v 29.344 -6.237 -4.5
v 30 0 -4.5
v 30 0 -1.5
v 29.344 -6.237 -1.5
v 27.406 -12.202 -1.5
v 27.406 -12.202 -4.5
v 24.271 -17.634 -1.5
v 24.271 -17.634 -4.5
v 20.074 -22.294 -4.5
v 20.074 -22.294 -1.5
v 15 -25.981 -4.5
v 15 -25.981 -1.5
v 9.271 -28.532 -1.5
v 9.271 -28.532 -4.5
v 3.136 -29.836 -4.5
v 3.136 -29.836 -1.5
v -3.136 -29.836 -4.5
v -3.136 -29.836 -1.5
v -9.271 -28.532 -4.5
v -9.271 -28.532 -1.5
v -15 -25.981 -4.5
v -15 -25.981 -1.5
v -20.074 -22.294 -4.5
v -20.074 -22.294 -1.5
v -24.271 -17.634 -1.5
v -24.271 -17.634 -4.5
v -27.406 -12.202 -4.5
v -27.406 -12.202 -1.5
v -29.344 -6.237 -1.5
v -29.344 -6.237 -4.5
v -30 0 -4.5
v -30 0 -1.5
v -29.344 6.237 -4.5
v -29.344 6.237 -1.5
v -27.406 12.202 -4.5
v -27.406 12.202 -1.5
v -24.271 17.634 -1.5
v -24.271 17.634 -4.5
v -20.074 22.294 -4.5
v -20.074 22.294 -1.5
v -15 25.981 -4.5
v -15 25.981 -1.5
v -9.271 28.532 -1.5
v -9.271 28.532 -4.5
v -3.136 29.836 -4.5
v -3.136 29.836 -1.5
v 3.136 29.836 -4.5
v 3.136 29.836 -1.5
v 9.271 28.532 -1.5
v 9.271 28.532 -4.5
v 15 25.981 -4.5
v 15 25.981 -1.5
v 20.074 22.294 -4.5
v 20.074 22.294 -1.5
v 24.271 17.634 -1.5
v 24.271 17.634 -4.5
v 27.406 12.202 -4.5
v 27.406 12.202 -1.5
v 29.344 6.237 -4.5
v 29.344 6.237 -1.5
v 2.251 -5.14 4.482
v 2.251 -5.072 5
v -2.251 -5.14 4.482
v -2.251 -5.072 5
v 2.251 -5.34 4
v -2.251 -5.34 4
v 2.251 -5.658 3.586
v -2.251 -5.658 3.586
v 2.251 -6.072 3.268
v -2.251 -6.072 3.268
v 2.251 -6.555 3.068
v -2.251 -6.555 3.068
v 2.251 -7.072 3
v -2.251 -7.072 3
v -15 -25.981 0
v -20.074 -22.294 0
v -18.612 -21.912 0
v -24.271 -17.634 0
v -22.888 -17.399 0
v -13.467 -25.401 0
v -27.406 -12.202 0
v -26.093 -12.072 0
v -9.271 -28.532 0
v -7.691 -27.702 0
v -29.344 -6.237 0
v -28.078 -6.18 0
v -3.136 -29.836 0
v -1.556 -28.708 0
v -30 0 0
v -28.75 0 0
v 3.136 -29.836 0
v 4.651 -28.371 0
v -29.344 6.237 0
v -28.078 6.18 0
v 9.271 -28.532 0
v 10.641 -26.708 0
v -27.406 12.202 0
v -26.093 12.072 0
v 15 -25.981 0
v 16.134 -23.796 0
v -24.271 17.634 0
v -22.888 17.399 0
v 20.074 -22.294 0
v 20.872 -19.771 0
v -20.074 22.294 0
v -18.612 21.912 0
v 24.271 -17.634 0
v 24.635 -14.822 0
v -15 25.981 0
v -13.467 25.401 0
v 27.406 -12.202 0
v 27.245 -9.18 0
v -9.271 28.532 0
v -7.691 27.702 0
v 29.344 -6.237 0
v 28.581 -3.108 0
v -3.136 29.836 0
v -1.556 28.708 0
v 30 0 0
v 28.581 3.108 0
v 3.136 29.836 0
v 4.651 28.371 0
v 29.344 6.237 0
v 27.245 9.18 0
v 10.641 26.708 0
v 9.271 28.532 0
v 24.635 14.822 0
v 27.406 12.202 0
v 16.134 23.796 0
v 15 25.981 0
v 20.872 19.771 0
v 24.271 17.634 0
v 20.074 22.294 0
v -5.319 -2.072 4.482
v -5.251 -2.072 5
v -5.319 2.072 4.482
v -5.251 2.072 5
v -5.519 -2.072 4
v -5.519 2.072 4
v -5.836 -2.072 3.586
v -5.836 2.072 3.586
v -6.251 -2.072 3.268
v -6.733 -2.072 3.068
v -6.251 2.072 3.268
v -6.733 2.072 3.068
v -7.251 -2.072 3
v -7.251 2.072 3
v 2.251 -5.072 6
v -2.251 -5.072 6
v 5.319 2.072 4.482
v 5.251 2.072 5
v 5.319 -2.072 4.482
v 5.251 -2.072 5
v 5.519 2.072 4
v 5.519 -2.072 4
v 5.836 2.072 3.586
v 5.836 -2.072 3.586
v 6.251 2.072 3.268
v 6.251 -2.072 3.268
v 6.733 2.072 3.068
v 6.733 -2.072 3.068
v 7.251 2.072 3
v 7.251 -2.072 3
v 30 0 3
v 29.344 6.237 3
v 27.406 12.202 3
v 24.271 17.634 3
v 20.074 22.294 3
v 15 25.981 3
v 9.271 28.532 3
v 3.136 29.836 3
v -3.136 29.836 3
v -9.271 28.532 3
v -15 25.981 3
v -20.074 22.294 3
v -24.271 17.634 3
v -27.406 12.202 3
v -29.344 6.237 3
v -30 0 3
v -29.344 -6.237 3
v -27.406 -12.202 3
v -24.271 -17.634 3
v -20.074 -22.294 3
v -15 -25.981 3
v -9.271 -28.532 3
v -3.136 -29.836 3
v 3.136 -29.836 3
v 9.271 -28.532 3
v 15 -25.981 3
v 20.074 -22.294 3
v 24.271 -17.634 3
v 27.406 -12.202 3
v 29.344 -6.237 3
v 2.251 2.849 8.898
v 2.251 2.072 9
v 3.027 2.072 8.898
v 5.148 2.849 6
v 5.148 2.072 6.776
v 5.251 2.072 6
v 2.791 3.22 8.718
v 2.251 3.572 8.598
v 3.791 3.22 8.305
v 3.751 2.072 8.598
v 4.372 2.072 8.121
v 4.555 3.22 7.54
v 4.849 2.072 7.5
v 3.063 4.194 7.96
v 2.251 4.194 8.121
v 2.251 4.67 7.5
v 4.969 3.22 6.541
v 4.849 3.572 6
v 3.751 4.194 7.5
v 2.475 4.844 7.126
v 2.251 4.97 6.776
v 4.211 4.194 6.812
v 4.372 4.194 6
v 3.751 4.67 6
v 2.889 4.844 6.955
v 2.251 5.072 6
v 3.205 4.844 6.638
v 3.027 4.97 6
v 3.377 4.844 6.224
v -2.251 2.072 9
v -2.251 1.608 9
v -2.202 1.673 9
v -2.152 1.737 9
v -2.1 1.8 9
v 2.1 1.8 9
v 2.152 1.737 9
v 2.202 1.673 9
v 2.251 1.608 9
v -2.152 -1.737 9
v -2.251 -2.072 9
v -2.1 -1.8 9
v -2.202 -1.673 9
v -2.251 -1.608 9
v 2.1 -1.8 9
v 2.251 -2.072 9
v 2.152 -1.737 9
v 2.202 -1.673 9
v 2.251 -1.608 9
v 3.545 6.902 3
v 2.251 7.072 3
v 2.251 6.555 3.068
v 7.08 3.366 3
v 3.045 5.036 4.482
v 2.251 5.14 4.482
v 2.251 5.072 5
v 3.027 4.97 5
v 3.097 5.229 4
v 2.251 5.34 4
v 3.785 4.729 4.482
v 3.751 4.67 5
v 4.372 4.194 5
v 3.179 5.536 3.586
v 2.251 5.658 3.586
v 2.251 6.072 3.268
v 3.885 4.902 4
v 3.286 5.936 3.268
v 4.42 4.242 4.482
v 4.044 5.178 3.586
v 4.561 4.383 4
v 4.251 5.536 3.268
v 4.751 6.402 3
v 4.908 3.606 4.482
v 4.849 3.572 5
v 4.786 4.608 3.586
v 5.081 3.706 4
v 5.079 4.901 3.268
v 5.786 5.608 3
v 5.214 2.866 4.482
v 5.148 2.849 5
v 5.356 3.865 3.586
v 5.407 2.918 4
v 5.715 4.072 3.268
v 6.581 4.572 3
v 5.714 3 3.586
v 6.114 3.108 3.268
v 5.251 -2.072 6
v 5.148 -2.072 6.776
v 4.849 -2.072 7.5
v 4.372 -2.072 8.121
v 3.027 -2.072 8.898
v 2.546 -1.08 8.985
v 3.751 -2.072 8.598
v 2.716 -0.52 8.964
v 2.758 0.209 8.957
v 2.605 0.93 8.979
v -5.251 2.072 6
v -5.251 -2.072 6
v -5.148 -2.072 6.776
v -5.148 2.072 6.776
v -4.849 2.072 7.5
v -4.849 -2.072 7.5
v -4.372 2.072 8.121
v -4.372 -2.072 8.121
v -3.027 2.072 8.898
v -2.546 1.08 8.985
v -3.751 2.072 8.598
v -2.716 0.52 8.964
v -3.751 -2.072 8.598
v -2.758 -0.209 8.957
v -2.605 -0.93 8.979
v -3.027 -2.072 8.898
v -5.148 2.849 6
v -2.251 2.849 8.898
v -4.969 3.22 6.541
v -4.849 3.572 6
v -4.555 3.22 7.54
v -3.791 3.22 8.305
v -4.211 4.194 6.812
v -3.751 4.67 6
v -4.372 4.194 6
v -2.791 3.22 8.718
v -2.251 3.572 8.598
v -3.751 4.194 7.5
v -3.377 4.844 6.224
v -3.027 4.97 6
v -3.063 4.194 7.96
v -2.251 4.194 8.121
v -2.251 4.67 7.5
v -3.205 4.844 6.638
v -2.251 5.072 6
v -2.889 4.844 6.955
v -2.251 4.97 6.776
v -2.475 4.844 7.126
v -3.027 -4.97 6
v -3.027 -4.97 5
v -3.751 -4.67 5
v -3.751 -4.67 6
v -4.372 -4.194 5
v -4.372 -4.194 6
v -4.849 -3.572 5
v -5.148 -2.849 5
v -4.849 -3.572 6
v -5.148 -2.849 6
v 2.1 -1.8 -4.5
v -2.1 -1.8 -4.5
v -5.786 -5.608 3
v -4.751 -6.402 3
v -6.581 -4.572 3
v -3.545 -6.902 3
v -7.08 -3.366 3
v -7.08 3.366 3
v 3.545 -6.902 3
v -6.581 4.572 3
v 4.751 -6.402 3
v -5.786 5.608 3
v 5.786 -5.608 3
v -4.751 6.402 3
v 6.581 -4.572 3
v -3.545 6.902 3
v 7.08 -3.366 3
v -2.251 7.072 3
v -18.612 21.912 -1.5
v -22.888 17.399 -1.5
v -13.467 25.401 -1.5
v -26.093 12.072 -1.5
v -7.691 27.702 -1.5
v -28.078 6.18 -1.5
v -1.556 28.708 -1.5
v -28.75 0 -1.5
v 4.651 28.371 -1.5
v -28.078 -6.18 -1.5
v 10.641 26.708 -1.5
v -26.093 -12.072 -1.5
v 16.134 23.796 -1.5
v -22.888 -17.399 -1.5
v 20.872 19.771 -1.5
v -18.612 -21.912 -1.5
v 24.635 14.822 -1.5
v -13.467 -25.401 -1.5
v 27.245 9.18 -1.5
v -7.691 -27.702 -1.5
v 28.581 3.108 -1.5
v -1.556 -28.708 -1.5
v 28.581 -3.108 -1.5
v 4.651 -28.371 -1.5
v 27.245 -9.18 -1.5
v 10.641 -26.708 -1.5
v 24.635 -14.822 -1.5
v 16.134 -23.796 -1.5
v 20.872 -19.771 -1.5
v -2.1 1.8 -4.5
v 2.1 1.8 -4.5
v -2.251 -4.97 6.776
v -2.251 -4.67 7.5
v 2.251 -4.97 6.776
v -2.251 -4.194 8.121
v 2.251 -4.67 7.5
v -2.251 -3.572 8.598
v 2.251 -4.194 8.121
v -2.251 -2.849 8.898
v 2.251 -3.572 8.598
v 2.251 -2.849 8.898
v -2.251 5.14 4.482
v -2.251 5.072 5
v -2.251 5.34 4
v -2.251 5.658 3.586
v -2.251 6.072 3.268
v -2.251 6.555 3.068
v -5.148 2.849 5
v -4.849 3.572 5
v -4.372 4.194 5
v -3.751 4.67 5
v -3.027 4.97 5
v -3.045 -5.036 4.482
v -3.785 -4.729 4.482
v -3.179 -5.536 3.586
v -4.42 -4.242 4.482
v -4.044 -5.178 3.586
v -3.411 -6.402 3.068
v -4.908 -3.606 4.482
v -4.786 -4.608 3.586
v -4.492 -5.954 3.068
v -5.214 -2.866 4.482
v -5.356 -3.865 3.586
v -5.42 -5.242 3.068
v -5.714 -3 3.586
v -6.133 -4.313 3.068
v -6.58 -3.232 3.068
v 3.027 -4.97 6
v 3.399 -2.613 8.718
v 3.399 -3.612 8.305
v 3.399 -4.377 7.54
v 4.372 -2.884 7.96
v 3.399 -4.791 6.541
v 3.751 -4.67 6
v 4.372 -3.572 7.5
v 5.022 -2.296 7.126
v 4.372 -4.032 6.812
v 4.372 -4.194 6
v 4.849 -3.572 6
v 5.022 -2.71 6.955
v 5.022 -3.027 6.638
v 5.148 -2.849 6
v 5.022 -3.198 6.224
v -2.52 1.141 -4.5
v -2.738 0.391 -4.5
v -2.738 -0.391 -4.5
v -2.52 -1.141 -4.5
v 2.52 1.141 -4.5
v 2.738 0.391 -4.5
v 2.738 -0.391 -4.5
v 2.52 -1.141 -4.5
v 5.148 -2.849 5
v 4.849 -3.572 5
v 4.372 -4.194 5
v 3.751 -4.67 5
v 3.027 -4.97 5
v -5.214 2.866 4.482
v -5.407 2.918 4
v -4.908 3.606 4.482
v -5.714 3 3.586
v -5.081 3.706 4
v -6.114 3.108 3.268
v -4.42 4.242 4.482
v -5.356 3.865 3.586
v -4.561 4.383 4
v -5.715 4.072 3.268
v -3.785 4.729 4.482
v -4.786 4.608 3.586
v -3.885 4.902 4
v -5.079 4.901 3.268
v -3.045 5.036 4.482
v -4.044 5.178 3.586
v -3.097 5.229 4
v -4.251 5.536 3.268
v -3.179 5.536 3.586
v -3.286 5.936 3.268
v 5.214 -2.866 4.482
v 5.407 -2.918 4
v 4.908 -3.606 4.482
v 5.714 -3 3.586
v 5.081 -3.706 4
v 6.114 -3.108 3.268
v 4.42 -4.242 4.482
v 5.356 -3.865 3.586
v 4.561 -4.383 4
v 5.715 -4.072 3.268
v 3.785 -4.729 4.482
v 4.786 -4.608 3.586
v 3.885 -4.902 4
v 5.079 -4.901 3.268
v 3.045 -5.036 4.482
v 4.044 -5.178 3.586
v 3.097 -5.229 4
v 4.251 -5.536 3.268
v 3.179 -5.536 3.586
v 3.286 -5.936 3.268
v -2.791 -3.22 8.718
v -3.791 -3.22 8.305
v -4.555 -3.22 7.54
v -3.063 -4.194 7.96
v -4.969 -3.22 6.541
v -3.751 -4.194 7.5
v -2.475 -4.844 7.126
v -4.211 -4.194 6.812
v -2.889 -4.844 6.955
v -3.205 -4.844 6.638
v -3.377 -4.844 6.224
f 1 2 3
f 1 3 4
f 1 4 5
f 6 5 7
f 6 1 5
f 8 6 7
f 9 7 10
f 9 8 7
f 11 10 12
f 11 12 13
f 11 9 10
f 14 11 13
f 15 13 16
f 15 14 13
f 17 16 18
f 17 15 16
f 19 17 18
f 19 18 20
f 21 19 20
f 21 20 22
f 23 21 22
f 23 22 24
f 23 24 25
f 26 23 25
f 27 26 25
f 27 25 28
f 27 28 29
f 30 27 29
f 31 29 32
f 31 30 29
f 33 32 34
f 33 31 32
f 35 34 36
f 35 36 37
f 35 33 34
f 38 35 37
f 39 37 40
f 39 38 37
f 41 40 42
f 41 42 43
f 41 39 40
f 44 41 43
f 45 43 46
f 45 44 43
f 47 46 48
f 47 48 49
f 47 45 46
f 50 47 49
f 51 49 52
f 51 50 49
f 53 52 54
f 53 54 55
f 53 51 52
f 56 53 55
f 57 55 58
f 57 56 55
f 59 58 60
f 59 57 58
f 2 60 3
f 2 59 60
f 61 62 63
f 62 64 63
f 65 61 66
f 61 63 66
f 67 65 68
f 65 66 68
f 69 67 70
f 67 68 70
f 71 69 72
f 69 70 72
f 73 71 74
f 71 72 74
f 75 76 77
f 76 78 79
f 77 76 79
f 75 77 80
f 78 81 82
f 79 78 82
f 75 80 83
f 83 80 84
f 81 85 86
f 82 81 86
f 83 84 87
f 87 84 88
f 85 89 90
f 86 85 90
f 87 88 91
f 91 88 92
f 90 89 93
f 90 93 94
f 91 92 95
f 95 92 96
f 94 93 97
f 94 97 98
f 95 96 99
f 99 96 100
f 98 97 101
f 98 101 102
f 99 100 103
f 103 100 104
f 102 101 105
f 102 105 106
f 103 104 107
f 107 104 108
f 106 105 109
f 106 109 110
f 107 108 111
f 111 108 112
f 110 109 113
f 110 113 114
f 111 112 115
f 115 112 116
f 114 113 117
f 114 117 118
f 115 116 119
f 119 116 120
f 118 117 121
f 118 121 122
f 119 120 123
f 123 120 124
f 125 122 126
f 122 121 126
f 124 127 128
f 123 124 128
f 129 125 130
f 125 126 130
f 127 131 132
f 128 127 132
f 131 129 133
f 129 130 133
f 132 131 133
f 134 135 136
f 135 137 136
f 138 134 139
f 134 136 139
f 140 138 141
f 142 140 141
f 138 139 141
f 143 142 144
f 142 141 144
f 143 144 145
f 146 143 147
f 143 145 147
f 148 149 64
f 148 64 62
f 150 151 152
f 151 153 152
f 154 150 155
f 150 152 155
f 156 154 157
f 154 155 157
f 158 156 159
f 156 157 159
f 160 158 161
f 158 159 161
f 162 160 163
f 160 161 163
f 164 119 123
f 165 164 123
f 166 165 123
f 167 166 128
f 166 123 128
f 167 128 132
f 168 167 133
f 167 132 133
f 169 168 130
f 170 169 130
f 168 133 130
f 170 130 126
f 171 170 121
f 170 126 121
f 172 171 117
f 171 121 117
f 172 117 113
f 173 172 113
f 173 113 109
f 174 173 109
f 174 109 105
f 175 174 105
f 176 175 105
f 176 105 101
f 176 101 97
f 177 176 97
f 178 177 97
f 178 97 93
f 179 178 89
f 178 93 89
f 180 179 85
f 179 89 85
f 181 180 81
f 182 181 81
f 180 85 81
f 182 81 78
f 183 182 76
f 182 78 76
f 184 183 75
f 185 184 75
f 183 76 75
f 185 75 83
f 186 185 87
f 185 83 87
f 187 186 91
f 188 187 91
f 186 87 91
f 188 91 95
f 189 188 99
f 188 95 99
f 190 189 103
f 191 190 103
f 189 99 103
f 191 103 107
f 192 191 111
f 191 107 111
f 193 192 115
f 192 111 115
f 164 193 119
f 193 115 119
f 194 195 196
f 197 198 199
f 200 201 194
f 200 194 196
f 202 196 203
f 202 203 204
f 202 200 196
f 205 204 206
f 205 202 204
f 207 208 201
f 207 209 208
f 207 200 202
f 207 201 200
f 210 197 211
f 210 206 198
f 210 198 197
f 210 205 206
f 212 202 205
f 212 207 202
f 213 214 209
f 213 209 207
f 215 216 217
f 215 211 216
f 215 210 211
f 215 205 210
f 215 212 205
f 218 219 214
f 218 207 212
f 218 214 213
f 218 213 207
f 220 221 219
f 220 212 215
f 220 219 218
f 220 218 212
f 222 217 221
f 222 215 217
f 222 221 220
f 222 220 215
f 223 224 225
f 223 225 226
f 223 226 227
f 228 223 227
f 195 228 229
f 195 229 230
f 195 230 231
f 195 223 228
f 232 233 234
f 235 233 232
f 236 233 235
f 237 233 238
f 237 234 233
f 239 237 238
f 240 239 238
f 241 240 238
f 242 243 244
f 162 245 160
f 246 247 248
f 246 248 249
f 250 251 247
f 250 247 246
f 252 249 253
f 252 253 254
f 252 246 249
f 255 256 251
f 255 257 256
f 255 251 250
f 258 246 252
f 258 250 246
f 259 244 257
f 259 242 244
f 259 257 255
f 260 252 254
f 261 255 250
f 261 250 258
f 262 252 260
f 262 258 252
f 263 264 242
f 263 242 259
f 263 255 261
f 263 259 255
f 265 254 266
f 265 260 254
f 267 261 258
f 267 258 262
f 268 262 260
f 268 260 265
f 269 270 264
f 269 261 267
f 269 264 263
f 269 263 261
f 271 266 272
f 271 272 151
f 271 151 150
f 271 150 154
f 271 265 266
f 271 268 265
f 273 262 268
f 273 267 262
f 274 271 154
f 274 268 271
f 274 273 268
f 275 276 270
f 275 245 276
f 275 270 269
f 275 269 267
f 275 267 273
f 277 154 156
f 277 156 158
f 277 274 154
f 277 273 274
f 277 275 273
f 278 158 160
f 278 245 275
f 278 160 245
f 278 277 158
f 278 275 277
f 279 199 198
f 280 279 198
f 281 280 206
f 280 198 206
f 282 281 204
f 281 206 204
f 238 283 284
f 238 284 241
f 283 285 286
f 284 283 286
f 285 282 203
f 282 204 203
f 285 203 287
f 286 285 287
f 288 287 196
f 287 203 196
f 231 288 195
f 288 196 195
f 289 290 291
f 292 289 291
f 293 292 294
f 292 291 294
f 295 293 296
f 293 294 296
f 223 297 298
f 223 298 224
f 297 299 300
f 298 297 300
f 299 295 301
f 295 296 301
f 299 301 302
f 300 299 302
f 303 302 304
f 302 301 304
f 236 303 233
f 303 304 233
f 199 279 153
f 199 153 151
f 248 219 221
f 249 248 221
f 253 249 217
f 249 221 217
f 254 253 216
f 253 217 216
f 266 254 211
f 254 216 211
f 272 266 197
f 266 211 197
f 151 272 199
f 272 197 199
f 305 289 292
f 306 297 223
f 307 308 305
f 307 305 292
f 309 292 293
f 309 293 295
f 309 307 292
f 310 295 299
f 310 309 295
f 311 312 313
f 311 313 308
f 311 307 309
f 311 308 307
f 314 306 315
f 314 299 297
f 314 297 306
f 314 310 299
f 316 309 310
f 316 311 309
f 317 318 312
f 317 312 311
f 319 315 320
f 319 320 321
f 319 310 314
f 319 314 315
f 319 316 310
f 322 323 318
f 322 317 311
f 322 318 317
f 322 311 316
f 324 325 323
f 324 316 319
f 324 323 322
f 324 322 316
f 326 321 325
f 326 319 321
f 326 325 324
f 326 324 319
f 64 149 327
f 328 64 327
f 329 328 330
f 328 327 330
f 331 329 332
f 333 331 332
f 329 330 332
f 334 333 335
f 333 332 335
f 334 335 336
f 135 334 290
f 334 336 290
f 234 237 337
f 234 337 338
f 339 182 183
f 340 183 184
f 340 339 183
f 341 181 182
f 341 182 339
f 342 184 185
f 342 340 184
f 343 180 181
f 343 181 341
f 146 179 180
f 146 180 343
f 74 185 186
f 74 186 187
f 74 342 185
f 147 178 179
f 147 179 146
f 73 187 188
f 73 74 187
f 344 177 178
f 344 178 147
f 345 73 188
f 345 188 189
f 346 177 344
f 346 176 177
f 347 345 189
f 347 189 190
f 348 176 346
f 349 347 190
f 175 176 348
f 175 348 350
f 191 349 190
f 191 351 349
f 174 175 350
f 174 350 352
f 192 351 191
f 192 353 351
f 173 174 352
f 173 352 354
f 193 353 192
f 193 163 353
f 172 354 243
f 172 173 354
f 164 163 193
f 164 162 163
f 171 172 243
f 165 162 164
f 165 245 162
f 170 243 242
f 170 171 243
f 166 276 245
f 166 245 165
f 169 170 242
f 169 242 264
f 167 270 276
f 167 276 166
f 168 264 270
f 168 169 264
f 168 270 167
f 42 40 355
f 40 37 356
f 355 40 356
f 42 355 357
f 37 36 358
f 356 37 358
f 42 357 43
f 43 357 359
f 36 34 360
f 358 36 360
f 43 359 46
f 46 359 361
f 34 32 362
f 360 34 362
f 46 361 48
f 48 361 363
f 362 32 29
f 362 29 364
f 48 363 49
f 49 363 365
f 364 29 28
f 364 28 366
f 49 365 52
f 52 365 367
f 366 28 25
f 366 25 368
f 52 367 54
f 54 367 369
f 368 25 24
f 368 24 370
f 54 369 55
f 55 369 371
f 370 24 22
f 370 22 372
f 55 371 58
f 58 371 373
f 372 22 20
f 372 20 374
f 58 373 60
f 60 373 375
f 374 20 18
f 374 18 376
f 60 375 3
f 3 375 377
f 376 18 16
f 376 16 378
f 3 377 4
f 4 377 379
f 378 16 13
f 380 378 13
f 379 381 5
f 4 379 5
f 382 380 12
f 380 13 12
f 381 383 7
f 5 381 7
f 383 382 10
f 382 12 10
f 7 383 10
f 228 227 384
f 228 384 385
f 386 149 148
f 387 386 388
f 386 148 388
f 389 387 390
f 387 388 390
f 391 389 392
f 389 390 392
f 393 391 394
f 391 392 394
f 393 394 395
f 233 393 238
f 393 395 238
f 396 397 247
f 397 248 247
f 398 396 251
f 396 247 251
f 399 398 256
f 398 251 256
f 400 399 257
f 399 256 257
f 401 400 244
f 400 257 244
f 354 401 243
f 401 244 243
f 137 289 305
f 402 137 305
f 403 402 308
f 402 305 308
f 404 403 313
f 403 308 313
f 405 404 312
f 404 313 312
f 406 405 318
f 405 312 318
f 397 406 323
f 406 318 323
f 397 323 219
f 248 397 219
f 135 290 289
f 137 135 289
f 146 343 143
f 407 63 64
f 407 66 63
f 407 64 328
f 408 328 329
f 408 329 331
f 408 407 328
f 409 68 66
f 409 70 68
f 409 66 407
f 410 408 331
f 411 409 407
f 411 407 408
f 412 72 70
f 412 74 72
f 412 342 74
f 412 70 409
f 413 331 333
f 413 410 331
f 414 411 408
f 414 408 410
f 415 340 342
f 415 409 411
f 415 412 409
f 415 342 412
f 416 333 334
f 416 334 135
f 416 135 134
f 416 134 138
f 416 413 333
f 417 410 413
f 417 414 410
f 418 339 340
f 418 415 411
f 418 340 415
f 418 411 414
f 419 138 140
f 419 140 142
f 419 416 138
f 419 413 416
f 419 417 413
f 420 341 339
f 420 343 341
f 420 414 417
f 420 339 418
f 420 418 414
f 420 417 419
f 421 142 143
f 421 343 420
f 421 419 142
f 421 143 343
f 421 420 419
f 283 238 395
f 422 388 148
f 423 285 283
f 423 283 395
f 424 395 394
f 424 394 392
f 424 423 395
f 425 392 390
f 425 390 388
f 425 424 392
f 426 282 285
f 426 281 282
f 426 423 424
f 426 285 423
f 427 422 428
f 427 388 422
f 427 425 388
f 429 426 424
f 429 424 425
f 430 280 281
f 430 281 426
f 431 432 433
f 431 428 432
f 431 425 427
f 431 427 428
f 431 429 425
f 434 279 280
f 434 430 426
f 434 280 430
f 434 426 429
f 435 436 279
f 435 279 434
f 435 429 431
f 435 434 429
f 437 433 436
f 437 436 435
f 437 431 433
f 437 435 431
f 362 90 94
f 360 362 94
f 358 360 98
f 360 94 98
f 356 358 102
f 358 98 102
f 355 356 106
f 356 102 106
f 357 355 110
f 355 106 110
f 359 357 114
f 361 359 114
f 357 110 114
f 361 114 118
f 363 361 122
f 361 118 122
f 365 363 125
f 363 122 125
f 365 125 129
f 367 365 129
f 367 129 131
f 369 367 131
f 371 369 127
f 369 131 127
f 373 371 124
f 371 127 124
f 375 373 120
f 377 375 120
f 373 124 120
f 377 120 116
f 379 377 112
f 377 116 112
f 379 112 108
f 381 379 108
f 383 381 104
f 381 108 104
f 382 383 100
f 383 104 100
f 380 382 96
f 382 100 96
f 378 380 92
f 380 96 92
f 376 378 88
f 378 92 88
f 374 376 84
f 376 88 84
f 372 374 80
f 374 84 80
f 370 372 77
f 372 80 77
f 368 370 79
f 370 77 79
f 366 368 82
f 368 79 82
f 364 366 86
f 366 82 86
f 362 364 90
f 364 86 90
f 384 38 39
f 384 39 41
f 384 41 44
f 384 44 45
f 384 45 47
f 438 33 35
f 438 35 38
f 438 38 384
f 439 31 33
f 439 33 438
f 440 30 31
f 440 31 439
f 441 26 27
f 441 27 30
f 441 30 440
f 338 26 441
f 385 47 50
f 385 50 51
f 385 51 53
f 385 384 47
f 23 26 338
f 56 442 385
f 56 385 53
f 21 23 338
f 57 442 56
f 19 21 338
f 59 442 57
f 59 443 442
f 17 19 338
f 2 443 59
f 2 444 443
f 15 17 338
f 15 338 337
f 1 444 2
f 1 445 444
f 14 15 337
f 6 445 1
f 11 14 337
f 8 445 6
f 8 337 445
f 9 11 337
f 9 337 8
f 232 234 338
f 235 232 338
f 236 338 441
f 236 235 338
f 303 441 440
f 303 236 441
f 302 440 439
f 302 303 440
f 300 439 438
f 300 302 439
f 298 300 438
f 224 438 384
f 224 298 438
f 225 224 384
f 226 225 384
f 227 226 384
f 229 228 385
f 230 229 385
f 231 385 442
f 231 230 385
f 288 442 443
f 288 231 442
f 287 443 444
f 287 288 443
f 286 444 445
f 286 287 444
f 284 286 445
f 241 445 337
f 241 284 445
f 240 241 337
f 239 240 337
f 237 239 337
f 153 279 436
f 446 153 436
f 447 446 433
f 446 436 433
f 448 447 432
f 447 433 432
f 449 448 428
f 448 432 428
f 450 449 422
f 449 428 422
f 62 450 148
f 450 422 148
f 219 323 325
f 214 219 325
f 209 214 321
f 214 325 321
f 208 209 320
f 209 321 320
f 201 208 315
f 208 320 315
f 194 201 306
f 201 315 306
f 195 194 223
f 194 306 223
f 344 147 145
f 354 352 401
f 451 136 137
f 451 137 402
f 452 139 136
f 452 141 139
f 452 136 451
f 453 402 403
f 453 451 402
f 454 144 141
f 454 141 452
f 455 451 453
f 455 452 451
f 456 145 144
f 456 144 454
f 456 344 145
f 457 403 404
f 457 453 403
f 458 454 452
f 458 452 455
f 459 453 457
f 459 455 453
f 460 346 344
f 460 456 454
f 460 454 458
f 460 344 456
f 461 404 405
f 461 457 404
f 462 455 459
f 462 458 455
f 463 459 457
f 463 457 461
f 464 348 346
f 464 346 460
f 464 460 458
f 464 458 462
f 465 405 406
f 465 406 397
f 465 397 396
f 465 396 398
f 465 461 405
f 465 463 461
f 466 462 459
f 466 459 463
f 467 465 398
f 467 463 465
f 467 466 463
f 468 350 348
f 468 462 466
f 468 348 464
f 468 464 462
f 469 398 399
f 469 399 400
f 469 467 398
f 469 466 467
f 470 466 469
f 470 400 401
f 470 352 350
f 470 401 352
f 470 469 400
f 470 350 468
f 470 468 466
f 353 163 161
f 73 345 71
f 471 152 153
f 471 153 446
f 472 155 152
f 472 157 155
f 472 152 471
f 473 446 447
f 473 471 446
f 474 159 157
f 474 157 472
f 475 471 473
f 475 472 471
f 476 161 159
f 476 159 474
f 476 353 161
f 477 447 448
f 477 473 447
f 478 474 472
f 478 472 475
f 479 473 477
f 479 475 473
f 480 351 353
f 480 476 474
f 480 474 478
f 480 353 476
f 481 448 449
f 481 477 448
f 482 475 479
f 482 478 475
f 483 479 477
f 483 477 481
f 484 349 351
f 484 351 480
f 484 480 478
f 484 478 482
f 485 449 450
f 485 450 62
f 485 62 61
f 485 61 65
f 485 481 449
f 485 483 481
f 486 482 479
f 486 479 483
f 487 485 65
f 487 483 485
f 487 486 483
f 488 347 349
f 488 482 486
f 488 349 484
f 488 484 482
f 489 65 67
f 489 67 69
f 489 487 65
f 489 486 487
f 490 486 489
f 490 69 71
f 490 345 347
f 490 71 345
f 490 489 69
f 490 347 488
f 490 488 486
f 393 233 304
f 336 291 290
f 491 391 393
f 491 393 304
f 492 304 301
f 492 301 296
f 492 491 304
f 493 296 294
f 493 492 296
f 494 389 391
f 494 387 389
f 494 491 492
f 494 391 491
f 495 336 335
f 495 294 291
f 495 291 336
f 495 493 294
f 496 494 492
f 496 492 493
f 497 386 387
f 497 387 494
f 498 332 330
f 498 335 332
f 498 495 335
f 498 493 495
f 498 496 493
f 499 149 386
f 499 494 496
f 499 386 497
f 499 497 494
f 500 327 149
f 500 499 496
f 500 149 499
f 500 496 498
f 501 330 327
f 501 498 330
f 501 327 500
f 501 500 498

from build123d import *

# Parameters (mm, degrees)
ESQUISSE2_R             = 30
BOSS_EXTRU_1_DEPTH      = 3
ENL_V_MAT_EXTRU_1_DEPTH = 43.532340636
BOSS_EXTRU_3_START      = 6
ESQUISSE5_W             = 10.501413836
ESQUISSE5_H             = 10.144569676
BOSS_EXTRU_3_DEPTH      = 6
ESQUISSE8_R             = 28.75
BOSS_EXTRU_4_DEPTH      = 1.5
BOSS_EXTRU_5_START      = 3
ESQUISSE9_R             = 30
BOSS_EXTRU_5_DEPTH      = 3
ENL_V_MAT_EXTRU_4_DEPTH = 44.370496884
CONG_1_R                = 3
CONG_2_R                = 2


with BuildPart() as part:
    # Esquisse2 → Boss.-Extru.1 (new body)
    with BuildSketch(Plane.XY):
        Circle(ESQUISSE2_R)
    extrude(amount=BOSS_EXTRU_1_DEPTH)

    # Esquisse4 → Enlèv. mat.-Extru.1 (cut, through all)
    with BuildSketch(Plane.XY.offset(3)):
        with BuildLine():
            Line((-2.1, -1.8), (2.1, -1.8))
            ThreePointArc((2.1, -1.8), (2.765863337, 0), (2.1, 1.8))
            Line((2.1, 1.8), (-2.1, 1.8))
            ThreePointArc((-2.1, 1.8), (-2.765863337, 0), (-2.1, -1.8))
        make_face()
    extrude(amount=-ENL_V_MAT_EXTRU_1_DEPTH, mode=Mode.SUBTRACT)

    # Esquisse5 → Boss.-Extru.3 (add)
    with BuildSketch(Plane.XY.offset(3).offset(BOSS_EXTRU_3_START)):
        Rectangle(ESQUISSE5_W, ESQUISSE5_H)
        with BuildLine():
            Line((-2.1, 1.8), (2.1, 1.8))
            ThreePointArc((2.1, 1.8), (2.765863337, 0), (2.1, -1.8))
            Line((2.1, -1.8), (-2.1, -1.8))
            ThreePointArc((-2.1, -1.8), (-2.765863337, 0), (-2.1, 1.8))
        make_face(mode=Mode.SUBTRACT)
    extrude(amount=-BOSS_EXTRU_3_DEPTH)

    # Esquisse8 → Boss.-Extru.4 (add)
    with BuildSketch(Plane(origin=(0, 0, 0), x_dir=(-1, 0, 0), z_dir=(0, 0, -1))):
        Circle(ESQUISSE8_R)
    extrude(amount=BOSS_EXTRU_4_DEPTH)

    # Esquisse9 → Boss.-Extru.5 (add)
    with BuildSketch(Plane(origin=(0, 0, -1.5), x_dir=(-1, 0, 0), z_dir=(0, 0, -1)).offset(BOSS_EXTRU_5_START)):
        with Locations(Location((0, 0, 0), (0, 0, 180))):
            Circle(ESQUISSE9_R)
    extrude(amount=-BOSS_EXTRU_5_DEPTH)

    # Esquisse10 → Enlèv. mat.-Extru.4 (cut, through all)
    with BuildSketch(Plane.XY):
        with BuildLine():
            Line((-2.1, 1.8), (2.1, 1.8))
            ThreePointArc((2.1, 1.8), (2.765863337, 0), (2.1, -1.8))
            Line((2.1, -1.8), (-2.1, -1.8))
            ThreePointArc((-2.1, -1.8), (-2.765863337, 0), (-2.1, 1.8))
        make_face()
    extrude(amount=-ENL_V_MAT_EXTRU_4_DEPTH, mode=Mode.SUBTRACT)

    # Congé1
    # the kernel refuses this fillet: 3 mm, written as the material it takes off along each edge
    with BuildSketch(Plane(origin=(-2.250706918, -2.072284838, 6), x_dir=(-1, 0, 0), z_dir=(0, -1, 0))) as cong_1_piece_1_section:
        Polygon((0, 0), (CONG_1_R, 0), (CONG_1_R, -CONG_1_R), (0, -CONG_1_R), align=None)
    cong_1_piece_1 = extrude(amount=CONG_1_R, mode=Mode.PRIVATE)
    cong_1_piece_1 = cong_1_piece_1 - Plane(origin=(-2.250706918, -2.072284838, 6), x_dir=(0.7071067811865475, 0, -0.7071067811865475), z_dir=(0, -1, 0)) * Sphere(CONG_1_R, mode=Mode.PRIVATE)
    add(cong_1_piece_1, mode=Mode.SUBTRACT)
    with BuildSketch(Plane(origin=(-2.250706918, 2.072284838, 6), x_dir=(-1, 0, 0), z_dir=(0, 1, 0))) as cong_1_piece_2_section:
        Polygon((0, 0), (CONG_1_R, 0), (CONG_1_R, CONG_1_R), (0, CONG_1_R), align=None)
    cong_1_piece_2 = extrude(amount=CONG_1_R, mode=Mode.PRIVATE)
    cong_1_piece_2 = cong_1_piece_2 - Plane(origin=(-2.250706918, 2.072284838, 6), x_dir=(0.7071067811865475, 0, -0.7071067811865475), z_dir=(0, 1, 0)) * Sphere(CONG_1_R, mode=Mode.PRIVATE)
    add(cong_1_piece_2, mode=Mode.SUBTRACT)
    with BuildSketch(Plane(origin=(2.250706918, -2.072284838, 6), x_dir=(0, -1, 0), z_dir=(1, 0, 0))) as cong_1_piece_3_section:
        Polygon((0, 0), (CONG_1_R, 0), (CONG_1_R, -CONG_1_R), (0, -CONG_1_R), align=None)
    cong_1_piece_3 = extrude(amount=CONG_1_R, mode=Mode.PRIVATE)
    cong_1_piece_3 = cong_1_piece_3 - Plane(origin=(2.250706918, -2.072284838, 6), x_dir=(0, 0.7071067811865475, -0.7071067811865475), z_dir=(1, 0, 0)) * Sphere(CONG_1_R, mode=Mode.PRIVATE)
    add(cong_1_piece_3, mode=Mode.SUBTRACT)
    with BuildSketch(Plane(origin=(2.250706918, 2.072284838, 6), x_dir=(1, 0, 0), z_dir=(0, 1, 0))) as cong_1_piece_4_section:
        Polygon((0, 0), (CONG_1_R, 0), (CONG_1_R, -CONG_1_R), (0, -CONG_1_R), align=None)
    cong_1_piece_4 = extrude(amount=CONG_1_R, mode=Mode.PRIVATE)
    cong_1_piece_4 = cong_1_piece_4 - Plane(origin=(2.250706918, 2.072284838, 6), x_dir=(-0.7071067811865475, 0, -0.7071067811865475), z_dir=(0, 1, 0)) * Sphere(CONG_1_R, mode=Mode.PRIVATE)
    add(cong_1_piece_4, mode=Mode.SUBTRACT)
    with BuildSketch(Plane(origin=(-5.250706918, -2.072284838, 9), x_dir=(0, 0, -1), z_dir=(0, 1, 0))) as cong_1_piece_5:
        with BuildLine():
            CenterArc((CONG_1_R, -CONG_1_R), CONG_1_R, 90, 90)
            Line((0, -CONG_1_R), (0, 0))
            Line((0, 0), (CONG_1_R, 0))
        make_face()
    extrude(amount=4.144569676, mode=Mode.SUBTRACT)
    with BuildSketch(Plane(origin=(-5.250706918, 5.072284838, 6), x_dir=(0, -1, 0), z_dir=(0, 0, -1)), Plane(origin=(5.250706918, -5.072284838, 6), x_dir=(0, 1, 0), z_dir=(0, 0, -1)), Plane(origin=(5.250706918, 5.072284838, 6), x_dir=(-1, 0, 0), z_dir=(0, 0, -1))) as cong_1_piece_6:
        with BuildLine():
            CenterArc((CONG_1_R, -CONG_1_R), CONG_1_R, 90, 90)
            Line((0, -CONG_1_R), (0, 0))
            Line((0, 0), (CONG_1_R, 0))
        make_face()
    extrude(amount=3, mode=Mode.SUBTRACT)
    with BuildSketch(Plane(origin=(2.250706918, -5.072284838, 9), x_dir=(0, 1, 0), z_dir=(-1, 0, 0)), Plane(origin=(-2.250706918, 5.072284838, 9), x_dir=(0, -1, 0), z_dir=(1, 0, 0))) as cong_1_piece_7:
        with BuildLine():
            CenterArc((CONG_1_R, CONG_1_R), CONG_1_R, 180, 90)
            Line((0, CONG_1_R), (0, 0))
            Line((0, 0), (CONG_1_R, 0))
        make_face()
    extrude(amount=4.501413836, mode=Mode.SUBTRACT)
    with BuildSketch(Plane(origin=(-5.250706918, -5.072284838, 6), x_dir=(0, 1, 0), z_dir=(0, 0, -1))) as cong_1_piece_8:
        with BuildLine():
            CenterArc((CONG_1_R, CONG_1_R), CONG_1_R, 180, 90)
            Line((0, CONG_1_R), (0, 0))
            Line((0, 0), (CONG_1_R, 0))
        make_face()
    extrude(amount=3, mode=Mode.SUBTRACT)
    with BuildSketch(Plane(origin=(5.250706918, 2.072284838, 9), x_dir=(-1, 0, 0), z_dir=(0, -1, 0))) as cong_1_piece_9:
        with BuildLine():
            CenterArc((CONG_1_R, CONG_1_R), CONG_1_R, 180, 90)
            Line((0, CONG_1_R), (0, 0))
            Line((0, 0), (CONG_1_R, 0))
        make_face()
    extrude(amount=4.144569676, mode=Mode.SUBTRACT)

    # Congé2
    cong_2_edges = [part.edges().sort_by_distance(p)[0] for p in [
        (-5.250706918, 0, 3),
        (0, 5.072284838, 3),
        (0, -5.072284838, 3),
        (5.250706918, 0, 3),
        (-4.372027261, 4.193605182, 3),
        (-4.372027261, -4.193605182, 3),
        (4.372027261, -4.193605182, 3),
        (4.372027261, 4.193605182, 3),
    ]]
    fillet(cong_2_edges, radius=CONG_2_R)


solid = part.part
